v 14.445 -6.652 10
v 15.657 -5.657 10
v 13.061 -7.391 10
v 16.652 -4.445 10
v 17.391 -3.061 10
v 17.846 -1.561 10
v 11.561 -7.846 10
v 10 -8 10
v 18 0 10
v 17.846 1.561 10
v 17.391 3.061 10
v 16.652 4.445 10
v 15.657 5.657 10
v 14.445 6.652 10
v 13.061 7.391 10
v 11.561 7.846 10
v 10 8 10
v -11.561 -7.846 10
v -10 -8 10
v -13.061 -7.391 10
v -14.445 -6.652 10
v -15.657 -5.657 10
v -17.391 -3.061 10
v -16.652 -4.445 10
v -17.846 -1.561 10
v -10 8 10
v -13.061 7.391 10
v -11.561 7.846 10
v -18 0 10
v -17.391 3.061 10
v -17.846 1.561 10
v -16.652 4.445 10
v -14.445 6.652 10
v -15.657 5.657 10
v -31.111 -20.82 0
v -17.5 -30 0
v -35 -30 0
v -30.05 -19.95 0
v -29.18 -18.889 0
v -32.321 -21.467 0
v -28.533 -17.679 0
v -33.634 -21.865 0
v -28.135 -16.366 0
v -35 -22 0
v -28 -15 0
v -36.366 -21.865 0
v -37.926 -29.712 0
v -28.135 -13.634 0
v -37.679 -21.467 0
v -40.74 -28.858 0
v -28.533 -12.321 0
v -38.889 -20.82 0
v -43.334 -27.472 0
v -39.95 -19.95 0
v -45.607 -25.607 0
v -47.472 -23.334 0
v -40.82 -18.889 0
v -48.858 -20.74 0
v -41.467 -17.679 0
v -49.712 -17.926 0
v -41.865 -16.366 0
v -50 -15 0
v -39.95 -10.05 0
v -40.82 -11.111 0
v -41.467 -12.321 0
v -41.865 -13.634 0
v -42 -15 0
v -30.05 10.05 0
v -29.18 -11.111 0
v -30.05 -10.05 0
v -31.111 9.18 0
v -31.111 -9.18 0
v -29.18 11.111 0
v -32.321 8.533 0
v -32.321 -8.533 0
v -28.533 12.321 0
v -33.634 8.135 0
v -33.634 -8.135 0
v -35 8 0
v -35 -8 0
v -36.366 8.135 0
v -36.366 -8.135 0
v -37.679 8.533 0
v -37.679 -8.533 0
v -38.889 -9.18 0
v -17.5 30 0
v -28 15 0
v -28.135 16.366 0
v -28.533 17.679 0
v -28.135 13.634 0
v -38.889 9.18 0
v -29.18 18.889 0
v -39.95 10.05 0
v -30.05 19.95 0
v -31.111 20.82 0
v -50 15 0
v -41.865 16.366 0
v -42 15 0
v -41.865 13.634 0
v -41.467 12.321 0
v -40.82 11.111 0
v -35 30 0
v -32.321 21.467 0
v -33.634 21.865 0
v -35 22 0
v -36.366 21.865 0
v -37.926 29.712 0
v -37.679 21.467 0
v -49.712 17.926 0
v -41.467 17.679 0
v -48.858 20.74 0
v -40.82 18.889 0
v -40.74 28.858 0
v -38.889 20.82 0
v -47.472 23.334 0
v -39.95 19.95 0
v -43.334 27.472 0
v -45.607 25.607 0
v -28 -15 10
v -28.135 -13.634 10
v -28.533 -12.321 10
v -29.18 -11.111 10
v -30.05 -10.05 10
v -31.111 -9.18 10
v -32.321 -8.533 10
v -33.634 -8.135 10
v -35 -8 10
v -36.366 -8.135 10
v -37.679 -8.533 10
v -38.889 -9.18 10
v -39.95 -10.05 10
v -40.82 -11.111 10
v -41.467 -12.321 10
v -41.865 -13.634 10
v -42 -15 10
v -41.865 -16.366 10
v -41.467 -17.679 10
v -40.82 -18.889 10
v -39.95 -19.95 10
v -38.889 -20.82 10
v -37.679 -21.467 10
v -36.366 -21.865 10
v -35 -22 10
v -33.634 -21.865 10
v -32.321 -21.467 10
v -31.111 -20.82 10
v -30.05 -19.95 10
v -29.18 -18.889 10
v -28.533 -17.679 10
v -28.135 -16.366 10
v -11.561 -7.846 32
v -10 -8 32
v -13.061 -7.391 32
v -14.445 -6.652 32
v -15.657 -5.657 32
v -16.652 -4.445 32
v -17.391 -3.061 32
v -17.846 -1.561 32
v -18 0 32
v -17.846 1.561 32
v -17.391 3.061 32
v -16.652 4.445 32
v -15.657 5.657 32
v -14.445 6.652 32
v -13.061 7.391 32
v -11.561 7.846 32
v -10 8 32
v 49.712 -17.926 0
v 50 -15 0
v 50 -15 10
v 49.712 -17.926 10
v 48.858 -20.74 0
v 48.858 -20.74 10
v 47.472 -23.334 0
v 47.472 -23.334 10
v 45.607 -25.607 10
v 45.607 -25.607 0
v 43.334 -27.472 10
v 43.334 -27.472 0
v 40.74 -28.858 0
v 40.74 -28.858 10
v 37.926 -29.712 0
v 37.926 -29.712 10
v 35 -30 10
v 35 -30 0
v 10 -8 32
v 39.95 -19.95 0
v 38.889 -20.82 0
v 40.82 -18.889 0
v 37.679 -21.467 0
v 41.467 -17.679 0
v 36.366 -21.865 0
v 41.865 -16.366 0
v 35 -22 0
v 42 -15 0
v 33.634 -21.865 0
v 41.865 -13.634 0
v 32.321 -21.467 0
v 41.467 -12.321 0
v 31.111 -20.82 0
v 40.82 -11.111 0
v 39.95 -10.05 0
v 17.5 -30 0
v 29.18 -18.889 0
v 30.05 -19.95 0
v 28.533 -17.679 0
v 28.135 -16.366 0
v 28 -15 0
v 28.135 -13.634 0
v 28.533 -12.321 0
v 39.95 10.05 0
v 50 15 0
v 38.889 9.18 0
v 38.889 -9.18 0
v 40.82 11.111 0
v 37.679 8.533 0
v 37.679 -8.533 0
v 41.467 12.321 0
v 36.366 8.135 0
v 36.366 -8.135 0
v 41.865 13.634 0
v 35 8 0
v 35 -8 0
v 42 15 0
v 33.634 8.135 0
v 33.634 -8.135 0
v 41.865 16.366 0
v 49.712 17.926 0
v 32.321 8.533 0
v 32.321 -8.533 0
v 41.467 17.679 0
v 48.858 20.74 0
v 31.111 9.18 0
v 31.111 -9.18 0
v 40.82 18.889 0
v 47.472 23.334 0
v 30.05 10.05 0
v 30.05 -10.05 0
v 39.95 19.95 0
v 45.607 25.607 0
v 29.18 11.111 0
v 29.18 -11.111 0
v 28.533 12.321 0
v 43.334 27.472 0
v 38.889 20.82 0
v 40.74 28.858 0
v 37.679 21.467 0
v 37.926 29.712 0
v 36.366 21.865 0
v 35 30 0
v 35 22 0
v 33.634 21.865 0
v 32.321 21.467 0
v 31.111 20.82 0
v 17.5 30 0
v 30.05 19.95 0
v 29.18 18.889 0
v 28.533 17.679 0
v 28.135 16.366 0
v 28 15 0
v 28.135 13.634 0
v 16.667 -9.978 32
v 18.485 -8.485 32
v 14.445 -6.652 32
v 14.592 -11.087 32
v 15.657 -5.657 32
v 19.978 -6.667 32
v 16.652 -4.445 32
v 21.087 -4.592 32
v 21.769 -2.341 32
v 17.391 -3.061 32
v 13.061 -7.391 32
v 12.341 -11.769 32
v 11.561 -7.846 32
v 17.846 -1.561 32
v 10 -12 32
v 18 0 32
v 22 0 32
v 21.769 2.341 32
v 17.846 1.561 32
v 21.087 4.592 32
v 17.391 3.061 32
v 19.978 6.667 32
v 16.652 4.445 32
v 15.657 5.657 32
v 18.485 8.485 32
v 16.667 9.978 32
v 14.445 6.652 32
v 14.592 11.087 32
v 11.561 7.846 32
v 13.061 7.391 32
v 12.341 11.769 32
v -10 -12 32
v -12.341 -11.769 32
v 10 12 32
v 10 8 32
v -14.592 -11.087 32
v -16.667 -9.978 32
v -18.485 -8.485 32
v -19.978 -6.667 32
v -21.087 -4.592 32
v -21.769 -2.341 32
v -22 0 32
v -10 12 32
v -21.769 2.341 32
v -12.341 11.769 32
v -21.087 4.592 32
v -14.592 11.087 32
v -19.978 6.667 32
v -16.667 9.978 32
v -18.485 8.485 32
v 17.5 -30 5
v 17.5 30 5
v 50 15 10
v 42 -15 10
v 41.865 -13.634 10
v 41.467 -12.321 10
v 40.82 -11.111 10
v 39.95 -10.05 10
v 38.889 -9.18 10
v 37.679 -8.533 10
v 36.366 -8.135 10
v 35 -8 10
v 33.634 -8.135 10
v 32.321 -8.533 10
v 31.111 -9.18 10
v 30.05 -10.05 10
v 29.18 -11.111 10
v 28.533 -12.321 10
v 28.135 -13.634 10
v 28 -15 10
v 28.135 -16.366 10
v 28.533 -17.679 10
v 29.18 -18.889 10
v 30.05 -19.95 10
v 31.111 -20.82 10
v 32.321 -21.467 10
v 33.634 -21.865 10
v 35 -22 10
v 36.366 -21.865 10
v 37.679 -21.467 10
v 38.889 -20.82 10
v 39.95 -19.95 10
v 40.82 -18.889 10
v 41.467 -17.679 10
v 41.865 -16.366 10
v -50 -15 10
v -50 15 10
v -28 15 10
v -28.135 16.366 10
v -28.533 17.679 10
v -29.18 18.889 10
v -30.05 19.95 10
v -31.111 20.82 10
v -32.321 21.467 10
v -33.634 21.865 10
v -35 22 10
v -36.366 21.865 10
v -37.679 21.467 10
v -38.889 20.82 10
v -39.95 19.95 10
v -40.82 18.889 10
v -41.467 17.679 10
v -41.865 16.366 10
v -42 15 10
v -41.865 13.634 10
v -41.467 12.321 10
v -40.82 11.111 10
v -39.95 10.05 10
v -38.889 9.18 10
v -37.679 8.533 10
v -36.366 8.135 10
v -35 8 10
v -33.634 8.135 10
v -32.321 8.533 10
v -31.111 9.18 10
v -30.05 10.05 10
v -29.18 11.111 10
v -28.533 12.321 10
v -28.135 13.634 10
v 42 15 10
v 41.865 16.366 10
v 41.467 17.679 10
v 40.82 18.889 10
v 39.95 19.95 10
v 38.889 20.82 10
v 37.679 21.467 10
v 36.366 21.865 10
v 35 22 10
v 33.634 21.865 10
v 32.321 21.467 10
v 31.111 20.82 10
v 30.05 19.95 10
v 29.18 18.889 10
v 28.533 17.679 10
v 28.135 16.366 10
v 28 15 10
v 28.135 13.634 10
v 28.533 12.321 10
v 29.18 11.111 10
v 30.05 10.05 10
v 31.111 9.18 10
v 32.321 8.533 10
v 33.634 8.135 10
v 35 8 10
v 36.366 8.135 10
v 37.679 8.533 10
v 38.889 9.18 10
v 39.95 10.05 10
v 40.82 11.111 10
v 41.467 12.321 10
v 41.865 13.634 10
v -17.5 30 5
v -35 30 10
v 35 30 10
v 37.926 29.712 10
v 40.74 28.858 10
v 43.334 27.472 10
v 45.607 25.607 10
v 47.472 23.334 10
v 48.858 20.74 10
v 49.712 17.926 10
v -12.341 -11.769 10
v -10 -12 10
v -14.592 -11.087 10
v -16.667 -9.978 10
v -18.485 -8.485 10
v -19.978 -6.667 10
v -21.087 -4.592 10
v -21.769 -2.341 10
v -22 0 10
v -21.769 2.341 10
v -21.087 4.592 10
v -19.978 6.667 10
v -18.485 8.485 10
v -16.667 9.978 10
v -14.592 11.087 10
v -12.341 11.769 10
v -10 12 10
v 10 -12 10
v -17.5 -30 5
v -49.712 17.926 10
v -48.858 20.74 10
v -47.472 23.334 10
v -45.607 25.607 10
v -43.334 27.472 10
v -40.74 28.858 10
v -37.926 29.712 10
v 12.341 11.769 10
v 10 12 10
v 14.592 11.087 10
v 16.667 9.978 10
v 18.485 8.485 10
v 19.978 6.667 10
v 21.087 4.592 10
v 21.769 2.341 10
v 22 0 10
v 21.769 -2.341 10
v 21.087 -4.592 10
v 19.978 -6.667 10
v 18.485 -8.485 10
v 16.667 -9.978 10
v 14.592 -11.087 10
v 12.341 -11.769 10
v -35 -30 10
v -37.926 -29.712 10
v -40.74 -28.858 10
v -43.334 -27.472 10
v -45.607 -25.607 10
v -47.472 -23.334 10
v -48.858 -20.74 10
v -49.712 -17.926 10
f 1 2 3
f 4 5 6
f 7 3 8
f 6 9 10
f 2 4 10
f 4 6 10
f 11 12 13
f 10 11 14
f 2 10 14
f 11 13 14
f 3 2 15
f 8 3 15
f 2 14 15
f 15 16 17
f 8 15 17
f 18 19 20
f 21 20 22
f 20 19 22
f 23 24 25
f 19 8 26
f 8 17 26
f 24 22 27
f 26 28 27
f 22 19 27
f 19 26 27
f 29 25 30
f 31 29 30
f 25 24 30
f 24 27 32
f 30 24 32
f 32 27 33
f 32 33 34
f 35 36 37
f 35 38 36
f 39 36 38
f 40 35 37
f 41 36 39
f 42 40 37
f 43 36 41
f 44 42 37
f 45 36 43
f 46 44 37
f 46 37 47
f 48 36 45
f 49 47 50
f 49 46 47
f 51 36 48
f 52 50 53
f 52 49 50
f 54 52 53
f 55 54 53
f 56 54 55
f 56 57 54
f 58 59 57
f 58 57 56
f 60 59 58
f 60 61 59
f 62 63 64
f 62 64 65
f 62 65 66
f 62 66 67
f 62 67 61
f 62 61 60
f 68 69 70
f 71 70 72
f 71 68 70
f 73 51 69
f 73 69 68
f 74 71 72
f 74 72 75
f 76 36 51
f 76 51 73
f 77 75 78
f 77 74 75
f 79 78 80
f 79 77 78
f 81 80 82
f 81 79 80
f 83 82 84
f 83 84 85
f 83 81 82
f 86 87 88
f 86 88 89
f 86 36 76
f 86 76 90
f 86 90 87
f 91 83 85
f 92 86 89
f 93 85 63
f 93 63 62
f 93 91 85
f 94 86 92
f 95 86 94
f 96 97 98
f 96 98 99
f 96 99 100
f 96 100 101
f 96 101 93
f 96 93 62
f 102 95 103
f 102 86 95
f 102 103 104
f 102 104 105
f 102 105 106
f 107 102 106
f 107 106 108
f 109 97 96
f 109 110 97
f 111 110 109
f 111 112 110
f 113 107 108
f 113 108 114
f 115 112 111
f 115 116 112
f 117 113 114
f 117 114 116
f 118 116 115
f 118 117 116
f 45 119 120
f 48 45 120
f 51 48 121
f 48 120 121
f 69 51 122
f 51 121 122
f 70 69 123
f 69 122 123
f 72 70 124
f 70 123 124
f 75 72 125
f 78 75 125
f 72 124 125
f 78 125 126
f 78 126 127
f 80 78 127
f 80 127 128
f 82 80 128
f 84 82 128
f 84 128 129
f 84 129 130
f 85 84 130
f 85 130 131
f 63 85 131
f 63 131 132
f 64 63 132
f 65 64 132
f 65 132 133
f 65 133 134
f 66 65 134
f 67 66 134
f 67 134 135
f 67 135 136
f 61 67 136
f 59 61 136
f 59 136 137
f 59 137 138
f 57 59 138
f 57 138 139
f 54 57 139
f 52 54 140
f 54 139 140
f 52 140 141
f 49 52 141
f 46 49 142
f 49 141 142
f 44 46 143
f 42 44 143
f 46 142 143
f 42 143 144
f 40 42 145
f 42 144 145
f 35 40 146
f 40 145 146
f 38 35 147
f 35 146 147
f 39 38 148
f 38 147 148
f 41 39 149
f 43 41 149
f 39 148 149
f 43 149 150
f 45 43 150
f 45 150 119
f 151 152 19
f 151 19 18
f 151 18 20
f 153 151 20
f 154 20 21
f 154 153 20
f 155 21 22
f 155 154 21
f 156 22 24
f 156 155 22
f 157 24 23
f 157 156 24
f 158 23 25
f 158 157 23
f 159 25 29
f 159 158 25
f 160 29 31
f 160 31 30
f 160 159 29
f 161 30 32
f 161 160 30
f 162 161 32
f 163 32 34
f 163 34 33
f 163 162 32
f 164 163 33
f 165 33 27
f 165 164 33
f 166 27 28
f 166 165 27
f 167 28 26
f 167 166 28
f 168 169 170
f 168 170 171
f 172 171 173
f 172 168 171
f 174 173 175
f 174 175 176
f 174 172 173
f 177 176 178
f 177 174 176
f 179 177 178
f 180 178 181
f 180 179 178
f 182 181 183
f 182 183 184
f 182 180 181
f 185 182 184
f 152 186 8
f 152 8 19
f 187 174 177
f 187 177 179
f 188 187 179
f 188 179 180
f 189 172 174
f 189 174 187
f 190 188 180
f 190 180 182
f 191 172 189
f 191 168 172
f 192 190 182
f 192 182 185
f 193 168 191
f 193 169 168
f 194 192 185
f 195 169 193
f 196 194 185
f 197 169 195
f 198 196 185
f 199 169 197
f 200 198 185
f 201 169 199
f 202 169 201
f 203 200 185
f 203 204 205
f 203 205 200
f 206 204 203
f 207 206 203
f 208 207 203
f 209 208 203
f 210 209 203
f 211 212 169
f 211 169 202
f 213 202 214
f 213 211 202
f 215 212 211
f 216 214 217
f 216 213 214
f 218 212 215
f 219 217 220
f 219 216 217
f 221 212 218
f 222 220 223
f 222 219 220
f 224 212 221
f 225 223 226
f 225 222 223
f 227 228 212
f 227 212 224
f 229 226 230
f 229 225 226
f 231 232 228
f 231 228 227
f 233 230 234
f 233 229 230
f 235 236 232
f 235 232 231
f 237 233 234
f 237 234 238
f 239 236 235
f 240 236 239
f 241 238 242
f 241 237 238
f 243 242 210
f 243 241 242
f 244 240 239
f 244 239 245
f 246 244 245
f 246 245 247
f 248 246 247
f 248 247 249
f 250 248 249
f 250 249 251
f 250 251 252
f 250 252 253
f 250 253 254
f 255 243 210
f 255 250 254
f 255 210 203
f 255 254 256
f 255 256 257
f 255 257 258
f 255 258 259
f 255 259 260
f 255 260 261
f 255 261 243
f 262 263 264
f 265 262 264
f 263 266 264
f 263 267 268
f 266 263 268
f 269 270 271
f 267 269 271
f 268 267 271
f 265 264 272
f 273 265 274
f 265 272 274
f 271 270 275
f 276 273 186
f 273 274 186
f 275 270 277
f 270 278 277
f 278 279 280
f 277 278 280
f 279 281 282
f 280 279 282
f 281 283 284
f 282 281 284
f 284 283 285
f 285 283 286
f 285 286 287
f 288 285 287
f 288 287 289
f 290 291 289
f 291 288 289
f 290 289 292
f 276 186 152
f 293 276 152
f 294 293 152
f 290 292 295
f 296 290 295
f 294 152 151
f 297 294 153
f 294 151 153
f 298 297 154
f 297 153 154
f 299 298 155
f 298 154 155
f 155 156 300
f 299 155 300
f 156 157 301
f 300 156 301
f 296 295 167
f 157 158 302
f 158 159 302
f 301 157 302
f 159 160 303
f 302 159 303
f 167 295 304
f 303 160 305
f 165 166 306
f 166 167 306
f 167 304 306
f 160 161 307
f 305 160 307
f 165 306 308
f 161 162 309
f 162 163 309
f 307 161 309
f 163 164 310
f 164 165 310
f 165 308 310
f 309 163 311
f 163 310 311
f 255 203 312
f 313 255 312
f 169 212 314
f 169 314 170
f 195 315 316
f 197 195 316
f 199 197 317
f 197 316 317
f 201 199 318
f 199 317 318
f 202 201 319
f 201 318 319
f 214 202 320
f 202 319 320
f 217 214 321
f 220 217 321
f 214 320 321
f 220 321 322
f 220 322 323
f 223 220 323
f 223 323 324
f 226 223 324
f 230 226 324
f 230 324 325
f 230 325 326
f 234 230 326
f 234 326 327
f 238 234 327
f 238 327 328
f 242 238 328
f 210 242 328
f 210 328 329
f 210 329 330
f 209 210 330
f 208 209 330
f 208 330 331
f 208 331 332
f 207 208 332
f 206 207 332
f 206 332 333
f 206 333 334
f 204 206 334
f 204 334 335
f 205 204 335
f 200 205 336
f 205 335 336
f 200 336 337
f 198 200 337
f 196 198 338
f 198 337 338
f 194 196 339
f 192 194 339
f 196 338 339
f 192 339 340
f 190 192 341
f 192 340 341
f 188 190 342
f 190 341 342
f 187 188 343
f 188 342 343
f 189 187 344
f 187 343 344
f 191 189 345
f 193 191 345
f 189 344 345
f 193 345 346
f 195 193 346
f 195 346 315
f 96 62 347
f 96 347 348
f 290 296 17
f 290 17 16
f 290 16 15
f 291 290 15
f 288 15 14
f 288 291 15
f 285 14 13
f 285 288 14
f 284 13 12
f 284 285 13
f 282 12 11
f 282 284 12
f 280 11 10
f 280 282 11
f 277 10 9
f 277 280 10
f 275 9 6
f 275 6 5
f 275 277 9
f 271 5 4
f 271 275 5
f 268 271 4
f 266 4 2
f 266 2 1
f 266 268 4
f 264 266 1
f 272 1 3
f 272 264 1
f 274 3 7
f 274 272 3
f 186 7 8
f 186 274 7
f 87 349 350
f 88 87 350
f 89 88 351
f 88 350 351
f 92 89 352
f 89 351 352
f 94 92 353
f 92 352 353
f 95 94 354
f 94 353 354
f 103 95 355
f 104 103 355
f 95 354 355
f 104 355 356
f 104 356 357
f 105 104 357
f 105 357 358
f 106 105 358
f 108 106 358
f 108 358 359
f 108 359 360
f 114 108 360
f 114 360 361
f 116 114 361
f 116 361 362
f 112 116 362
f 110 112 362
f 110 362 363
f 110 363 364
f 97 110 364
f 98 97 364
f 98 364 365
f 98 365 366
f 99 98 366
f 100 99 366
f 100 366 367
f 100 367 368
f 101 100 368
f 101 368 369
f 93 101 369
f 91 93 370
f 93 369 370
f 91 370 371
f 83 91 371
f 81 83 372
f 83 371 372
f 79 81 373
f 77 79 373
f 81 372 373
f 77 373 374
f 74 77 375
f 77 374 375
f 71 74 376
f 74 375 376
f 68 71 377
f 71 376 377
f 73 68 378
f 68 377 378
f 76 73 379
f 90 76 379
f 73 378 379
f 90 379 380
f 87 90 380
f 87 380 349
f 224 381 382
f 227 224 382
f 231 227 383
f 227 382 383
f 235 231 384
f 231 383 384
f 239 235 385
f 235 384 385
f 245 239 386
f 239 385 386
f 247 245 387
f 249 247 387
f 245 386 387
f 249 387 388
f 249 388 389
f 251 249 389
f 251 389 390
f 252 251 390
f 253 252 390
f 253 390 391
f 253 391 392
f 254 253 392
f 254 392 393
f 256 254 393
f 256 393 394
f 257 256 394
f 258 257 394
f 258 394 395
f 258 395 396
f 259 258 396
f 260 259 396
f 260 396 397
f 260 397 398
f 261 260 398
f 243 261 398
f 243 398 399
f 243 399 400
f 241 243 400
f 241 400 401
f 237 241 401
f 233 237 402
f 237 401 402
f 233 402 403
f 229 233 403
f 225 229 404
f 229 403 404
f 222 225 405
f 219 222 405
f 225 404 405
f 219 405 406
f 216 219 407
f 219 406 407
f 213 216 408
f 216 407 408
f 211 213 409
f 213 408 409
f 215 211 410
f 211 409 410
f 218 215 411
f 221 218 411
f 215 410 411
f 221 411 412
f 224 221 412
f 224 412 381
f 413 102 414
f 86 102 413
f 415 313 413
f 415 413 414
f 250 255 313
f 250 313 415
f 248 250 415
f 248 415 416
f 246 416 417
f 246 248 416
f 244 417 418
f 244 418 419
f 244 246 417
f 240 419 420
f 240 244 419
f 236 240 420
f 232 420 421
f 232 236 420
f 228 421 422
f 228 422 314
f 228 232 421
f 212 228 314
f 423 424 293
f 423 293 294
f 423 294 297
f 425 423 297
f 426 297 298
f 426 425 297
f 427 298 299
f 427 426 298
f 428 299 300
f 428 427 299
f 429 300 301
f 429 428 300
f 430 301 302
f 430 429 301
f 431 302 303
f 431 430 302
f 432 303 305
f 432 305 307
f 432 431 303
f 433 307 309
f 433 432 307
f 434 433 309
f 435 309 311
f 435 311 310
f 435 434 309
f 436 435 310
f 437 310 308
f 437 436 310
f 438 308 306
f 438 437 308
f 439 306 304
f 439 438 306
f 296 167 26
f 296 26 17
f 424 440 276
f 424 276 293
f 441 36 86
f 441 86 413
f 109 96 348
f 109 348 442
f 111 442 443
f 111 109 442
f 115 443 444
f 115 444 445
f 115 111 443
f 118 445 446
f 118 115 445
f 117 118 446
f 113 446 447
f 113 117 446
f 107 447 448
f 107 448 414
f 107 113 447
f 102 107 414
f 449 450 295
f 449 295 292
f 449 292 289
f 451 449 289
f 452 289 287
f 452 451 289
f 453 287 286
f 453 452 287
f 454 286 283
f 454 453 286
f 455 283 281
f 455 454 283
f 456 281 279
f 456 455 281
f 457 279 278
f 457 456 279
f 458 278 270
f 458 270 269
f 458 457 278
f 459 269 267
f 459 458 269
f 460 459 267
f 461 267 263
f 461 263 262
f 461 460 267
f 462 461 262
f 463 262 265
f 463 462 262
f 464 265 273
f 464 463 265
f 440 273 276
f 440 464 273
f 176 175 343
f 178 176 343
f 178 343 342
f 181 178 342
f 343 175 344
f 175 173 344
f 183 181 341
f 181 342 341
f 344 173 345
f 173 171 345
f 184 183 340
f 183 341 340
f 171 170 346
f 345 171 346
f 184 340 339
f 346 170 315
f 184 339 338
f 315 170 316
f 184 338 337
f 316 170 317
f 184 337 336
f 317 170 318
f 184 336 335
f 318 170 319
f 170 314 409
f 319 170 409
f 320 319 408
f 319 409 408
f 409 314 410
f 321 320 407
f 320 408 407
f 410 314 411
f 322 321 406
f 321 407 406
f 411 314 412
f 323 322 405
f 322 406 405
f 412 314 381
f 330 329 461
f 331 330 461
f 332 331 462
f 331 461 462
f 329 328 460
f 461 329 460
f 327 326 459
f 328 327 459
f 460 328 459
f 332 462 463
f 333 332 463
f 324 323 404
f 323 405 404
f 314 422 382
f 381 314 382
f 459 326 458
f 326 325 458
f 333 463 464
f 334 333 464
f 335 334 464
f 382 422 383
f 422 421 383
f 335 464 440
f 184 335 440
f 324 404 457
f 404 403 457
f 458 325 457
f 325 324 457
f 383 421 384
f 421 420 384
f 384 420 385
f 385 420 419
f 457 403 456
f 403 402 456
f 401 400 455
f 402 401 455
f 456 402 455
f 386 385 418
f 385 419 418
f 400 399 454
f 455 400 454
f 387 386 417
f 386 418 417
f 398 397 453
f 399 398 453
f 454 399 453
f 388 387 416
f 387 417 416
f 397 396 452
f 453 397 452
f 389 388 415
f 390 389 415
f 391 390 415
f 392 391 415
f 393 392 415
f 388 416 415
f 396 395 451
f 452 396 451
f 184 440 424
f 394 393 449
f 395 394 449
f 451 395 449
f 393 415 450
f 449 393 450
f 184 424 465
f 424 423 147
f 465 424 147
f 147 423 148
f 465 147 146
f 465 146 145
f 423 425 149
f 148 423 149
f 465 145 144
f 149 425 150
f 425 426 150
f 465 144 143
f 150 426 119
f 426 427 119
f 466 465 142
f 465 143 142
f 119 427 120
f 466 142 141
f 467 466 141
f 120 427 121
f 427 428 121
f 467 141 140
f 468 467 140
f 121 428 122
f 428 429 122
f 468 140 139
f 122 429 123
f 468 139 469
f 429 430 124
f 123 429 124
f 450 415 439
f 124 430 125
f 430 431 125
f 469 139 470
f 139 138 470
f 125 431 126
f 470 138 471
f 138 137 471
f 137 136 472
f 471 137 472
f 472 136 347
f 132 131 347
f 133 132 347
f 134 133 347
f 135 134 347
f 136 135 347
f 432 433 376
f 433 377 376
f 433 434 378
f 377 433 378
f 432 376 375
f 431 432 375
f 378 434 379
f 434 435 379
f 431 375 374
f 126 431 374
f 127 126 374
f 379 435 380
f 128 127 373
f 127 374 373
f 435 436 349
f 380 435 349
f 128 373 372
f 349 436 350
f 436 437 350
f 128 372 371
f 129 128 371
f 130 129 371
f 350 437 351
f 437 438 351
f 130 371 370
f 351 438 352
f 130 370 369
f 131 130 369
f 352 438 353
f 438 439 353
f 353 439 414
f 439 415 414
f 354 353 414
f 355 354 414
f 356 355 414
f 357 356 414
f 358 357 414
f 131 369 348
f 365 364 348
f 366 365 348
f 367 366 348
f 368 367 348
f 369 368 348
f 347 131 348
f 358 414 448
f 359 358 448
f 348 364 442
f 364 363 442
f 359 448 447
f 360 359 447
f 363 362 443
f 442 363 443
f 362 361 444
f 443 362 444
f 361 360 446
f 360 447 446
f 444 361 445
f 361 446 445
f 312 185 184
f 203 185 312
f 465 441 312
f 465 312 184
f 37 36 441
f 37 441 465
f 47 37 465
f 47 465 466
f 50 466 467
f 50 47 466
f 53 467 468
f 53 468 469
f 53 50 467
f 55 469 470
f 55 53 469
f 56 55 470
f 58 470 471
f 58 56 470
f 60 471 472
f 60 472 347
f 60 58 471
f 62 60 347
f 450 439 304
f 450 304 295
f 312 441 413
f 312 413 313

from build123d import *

# Parameters (mm, degrees)
BOSS_EXTRUDE1_DEPTH = 10
CUT_EXTRUDE1_REACH  = 80.74
SKETCH2_W           = 35
SKETCH2_H           = 5
CUT_EXTRUDE2_REACH  = 61.161
SKETCH3_R           = 7
BOSS_EXTRUDE2_DEPTH = 22
CUT_EXTRUDE3_DEPTH  = 22


with BuildPart() as part:
    # Sketch1 → Boss-Extrude1 (new body)
    with BuildSketch(Plane.XY):
        with BuildLine():
            Line((-35, 30), (35, 30))
            ThreePointArc((35, 30), (45.606601718, 25.606601718), (50, 15))
            Line((50, 15), (50, -15))
            ThreePointArc((50, -15), (45.606601718, -25.606601718), (35, -30))
            Line((35, -30), (-35, -30))
            ThreePointArc((-35, -30), (-45.606601718, -25.606601718), (-50, -15))
            Line((-50, -15), (-50, 15))
            ThreePointArc((-50, 15), (-45.606601718, 25.606601718), (-35, 30))
        make_face()
    extrude(amount=BOSS_EXTRUDE1_DEPTH)

    # Sketch2 → Cut-Extrude1 (cut, up to next)
    with BuildSketch(Plane.XZ.offset(30), mode=Mode.PRIVATE) as cut_extrude1_sk1:
        with Locations((0, 2.5)):
            Rectangle(SKETCH2_W, SKETCH2_H)
    cut_extrude1_tool1 = extrude(cut_extrude1_sk1.sketch, amount=-CUT_EXTRUDE1_REACH, mode=Mode.PRIVATE) & part.part
    add(cut_extrude1_tool1.solids().sort_by_distance((0, -30, 2.5))[0], mode=Mode.SUBTRACT)

    # Sketch3 → Cut-Extrude2 (cut, up to next)
    with BuildSketch(Plane.XY.offset(10), mode=Mode.PRIVATE) as cut_extrude2_sk1:
        with Locations((-35, 15)):
            Circle(SKETCH3_R)
    cut_extrude2_tool1 = extrude(cut_extrude2_sk1.sketch, amount=-CUT_EXTRUDE2_REACH, mode=Mode.PRIVATE) & part.part
    # Sketch3 → Cut-Extrude2 (cut, up to next)
    with BuildSketch(Plane.XY.offset(10), mode=Mode.PRIVATE) as cut_extrude2_sk2:
        with Locations((35, 15)):
            Circle(SKETCH3_R)
    cut_extrude2_tool2 = extrude(cut_extrude2_sk2.sketch, amount=-CUT_EXTRUDE2_REACH, mode=Mode.PRIVATE) & part.part
    # Sketch3 → Cut-Extrude2 (cut, up to next)
    with BuildSketch(Plane.XY.offset(10), mode=Mode.PRIVATE) as cut_extrude2_sk3:
        with Locations((35, -15)):
            Circle(SKETCH3_R)
    cut_extrude2_tool3 = extrude(cut_extrude2_sk3.sketch, amount=-CUT_EXTRUDE2_REACH, mode=Mode.PRIVATE) & part.part
    # Sketch3 → Cut-Extrude2 (cut, up to next)
    with BuildSketch(Plane.XY.offset(10), mode=Mode.PRIVATE) as cut_extrude2_sk4:
        with Locations((-35, -15)):
            Circle(SKETCH3_R)
    cut_extrude2_tool4 = extrude(cut_extrude2_sk4.sketch, amount=-CUT_EXTRUDE2_REACH, mode=Mode.PRIVATE) & part.part
    add(cut_extrude2_tool1.solids().sort_by_distance((-35, 15, 10))[0], mode=Mode.SUBTRACT)
    add(cut_extrude2_tool2.solids().sort_by_distance((35, 15, 10))[0], mode=Mode.SUBTRACT)
    add(cut_extrude2_tool3.solids().sort_by_distance((35, -15, 10))[0], mode=Mode.SUBTRACT)
    add(cut_extrude2_tool4.solids().sort_by_distance((-35, -15, 10))[0], mode=Mode.SUBTRACT)

    # Sketch4 → Boss-Extrude2 (add)
    with BuildSketch(Plane.XY.offset(10)):
        with BuildLine():
            Line((-10, 12), (10, 12))
            ThreePointArc((10, 12), (22, 0), (10, -12))
            Line((10, -12), (-10, -12))
            ThreePointArc((-10, -12), (-22, 0), (-10, 12))
        make_face()
    extrude(amount=BOSS_EXTRUDE2_DEPTH)

    # Sketch5 → Cut-Extrude3 (cut)
    with BuildSketch(Plane.XY.offset(32)):
        with BuildLine():
            Line((-10, 8), (10, 8))
            ThreePointArc((10, 8), (18, 0), (10, -8))
            Line((10, -8), (-10, -8))
            ThreePointArc((-10, -8), (-18, 0), (-10, 8))
        make_face()
    extrude(amount=-CUT_EXTRUDE3_DEPTH, mode=Mode.SUBTRACT)


solid = part.part
